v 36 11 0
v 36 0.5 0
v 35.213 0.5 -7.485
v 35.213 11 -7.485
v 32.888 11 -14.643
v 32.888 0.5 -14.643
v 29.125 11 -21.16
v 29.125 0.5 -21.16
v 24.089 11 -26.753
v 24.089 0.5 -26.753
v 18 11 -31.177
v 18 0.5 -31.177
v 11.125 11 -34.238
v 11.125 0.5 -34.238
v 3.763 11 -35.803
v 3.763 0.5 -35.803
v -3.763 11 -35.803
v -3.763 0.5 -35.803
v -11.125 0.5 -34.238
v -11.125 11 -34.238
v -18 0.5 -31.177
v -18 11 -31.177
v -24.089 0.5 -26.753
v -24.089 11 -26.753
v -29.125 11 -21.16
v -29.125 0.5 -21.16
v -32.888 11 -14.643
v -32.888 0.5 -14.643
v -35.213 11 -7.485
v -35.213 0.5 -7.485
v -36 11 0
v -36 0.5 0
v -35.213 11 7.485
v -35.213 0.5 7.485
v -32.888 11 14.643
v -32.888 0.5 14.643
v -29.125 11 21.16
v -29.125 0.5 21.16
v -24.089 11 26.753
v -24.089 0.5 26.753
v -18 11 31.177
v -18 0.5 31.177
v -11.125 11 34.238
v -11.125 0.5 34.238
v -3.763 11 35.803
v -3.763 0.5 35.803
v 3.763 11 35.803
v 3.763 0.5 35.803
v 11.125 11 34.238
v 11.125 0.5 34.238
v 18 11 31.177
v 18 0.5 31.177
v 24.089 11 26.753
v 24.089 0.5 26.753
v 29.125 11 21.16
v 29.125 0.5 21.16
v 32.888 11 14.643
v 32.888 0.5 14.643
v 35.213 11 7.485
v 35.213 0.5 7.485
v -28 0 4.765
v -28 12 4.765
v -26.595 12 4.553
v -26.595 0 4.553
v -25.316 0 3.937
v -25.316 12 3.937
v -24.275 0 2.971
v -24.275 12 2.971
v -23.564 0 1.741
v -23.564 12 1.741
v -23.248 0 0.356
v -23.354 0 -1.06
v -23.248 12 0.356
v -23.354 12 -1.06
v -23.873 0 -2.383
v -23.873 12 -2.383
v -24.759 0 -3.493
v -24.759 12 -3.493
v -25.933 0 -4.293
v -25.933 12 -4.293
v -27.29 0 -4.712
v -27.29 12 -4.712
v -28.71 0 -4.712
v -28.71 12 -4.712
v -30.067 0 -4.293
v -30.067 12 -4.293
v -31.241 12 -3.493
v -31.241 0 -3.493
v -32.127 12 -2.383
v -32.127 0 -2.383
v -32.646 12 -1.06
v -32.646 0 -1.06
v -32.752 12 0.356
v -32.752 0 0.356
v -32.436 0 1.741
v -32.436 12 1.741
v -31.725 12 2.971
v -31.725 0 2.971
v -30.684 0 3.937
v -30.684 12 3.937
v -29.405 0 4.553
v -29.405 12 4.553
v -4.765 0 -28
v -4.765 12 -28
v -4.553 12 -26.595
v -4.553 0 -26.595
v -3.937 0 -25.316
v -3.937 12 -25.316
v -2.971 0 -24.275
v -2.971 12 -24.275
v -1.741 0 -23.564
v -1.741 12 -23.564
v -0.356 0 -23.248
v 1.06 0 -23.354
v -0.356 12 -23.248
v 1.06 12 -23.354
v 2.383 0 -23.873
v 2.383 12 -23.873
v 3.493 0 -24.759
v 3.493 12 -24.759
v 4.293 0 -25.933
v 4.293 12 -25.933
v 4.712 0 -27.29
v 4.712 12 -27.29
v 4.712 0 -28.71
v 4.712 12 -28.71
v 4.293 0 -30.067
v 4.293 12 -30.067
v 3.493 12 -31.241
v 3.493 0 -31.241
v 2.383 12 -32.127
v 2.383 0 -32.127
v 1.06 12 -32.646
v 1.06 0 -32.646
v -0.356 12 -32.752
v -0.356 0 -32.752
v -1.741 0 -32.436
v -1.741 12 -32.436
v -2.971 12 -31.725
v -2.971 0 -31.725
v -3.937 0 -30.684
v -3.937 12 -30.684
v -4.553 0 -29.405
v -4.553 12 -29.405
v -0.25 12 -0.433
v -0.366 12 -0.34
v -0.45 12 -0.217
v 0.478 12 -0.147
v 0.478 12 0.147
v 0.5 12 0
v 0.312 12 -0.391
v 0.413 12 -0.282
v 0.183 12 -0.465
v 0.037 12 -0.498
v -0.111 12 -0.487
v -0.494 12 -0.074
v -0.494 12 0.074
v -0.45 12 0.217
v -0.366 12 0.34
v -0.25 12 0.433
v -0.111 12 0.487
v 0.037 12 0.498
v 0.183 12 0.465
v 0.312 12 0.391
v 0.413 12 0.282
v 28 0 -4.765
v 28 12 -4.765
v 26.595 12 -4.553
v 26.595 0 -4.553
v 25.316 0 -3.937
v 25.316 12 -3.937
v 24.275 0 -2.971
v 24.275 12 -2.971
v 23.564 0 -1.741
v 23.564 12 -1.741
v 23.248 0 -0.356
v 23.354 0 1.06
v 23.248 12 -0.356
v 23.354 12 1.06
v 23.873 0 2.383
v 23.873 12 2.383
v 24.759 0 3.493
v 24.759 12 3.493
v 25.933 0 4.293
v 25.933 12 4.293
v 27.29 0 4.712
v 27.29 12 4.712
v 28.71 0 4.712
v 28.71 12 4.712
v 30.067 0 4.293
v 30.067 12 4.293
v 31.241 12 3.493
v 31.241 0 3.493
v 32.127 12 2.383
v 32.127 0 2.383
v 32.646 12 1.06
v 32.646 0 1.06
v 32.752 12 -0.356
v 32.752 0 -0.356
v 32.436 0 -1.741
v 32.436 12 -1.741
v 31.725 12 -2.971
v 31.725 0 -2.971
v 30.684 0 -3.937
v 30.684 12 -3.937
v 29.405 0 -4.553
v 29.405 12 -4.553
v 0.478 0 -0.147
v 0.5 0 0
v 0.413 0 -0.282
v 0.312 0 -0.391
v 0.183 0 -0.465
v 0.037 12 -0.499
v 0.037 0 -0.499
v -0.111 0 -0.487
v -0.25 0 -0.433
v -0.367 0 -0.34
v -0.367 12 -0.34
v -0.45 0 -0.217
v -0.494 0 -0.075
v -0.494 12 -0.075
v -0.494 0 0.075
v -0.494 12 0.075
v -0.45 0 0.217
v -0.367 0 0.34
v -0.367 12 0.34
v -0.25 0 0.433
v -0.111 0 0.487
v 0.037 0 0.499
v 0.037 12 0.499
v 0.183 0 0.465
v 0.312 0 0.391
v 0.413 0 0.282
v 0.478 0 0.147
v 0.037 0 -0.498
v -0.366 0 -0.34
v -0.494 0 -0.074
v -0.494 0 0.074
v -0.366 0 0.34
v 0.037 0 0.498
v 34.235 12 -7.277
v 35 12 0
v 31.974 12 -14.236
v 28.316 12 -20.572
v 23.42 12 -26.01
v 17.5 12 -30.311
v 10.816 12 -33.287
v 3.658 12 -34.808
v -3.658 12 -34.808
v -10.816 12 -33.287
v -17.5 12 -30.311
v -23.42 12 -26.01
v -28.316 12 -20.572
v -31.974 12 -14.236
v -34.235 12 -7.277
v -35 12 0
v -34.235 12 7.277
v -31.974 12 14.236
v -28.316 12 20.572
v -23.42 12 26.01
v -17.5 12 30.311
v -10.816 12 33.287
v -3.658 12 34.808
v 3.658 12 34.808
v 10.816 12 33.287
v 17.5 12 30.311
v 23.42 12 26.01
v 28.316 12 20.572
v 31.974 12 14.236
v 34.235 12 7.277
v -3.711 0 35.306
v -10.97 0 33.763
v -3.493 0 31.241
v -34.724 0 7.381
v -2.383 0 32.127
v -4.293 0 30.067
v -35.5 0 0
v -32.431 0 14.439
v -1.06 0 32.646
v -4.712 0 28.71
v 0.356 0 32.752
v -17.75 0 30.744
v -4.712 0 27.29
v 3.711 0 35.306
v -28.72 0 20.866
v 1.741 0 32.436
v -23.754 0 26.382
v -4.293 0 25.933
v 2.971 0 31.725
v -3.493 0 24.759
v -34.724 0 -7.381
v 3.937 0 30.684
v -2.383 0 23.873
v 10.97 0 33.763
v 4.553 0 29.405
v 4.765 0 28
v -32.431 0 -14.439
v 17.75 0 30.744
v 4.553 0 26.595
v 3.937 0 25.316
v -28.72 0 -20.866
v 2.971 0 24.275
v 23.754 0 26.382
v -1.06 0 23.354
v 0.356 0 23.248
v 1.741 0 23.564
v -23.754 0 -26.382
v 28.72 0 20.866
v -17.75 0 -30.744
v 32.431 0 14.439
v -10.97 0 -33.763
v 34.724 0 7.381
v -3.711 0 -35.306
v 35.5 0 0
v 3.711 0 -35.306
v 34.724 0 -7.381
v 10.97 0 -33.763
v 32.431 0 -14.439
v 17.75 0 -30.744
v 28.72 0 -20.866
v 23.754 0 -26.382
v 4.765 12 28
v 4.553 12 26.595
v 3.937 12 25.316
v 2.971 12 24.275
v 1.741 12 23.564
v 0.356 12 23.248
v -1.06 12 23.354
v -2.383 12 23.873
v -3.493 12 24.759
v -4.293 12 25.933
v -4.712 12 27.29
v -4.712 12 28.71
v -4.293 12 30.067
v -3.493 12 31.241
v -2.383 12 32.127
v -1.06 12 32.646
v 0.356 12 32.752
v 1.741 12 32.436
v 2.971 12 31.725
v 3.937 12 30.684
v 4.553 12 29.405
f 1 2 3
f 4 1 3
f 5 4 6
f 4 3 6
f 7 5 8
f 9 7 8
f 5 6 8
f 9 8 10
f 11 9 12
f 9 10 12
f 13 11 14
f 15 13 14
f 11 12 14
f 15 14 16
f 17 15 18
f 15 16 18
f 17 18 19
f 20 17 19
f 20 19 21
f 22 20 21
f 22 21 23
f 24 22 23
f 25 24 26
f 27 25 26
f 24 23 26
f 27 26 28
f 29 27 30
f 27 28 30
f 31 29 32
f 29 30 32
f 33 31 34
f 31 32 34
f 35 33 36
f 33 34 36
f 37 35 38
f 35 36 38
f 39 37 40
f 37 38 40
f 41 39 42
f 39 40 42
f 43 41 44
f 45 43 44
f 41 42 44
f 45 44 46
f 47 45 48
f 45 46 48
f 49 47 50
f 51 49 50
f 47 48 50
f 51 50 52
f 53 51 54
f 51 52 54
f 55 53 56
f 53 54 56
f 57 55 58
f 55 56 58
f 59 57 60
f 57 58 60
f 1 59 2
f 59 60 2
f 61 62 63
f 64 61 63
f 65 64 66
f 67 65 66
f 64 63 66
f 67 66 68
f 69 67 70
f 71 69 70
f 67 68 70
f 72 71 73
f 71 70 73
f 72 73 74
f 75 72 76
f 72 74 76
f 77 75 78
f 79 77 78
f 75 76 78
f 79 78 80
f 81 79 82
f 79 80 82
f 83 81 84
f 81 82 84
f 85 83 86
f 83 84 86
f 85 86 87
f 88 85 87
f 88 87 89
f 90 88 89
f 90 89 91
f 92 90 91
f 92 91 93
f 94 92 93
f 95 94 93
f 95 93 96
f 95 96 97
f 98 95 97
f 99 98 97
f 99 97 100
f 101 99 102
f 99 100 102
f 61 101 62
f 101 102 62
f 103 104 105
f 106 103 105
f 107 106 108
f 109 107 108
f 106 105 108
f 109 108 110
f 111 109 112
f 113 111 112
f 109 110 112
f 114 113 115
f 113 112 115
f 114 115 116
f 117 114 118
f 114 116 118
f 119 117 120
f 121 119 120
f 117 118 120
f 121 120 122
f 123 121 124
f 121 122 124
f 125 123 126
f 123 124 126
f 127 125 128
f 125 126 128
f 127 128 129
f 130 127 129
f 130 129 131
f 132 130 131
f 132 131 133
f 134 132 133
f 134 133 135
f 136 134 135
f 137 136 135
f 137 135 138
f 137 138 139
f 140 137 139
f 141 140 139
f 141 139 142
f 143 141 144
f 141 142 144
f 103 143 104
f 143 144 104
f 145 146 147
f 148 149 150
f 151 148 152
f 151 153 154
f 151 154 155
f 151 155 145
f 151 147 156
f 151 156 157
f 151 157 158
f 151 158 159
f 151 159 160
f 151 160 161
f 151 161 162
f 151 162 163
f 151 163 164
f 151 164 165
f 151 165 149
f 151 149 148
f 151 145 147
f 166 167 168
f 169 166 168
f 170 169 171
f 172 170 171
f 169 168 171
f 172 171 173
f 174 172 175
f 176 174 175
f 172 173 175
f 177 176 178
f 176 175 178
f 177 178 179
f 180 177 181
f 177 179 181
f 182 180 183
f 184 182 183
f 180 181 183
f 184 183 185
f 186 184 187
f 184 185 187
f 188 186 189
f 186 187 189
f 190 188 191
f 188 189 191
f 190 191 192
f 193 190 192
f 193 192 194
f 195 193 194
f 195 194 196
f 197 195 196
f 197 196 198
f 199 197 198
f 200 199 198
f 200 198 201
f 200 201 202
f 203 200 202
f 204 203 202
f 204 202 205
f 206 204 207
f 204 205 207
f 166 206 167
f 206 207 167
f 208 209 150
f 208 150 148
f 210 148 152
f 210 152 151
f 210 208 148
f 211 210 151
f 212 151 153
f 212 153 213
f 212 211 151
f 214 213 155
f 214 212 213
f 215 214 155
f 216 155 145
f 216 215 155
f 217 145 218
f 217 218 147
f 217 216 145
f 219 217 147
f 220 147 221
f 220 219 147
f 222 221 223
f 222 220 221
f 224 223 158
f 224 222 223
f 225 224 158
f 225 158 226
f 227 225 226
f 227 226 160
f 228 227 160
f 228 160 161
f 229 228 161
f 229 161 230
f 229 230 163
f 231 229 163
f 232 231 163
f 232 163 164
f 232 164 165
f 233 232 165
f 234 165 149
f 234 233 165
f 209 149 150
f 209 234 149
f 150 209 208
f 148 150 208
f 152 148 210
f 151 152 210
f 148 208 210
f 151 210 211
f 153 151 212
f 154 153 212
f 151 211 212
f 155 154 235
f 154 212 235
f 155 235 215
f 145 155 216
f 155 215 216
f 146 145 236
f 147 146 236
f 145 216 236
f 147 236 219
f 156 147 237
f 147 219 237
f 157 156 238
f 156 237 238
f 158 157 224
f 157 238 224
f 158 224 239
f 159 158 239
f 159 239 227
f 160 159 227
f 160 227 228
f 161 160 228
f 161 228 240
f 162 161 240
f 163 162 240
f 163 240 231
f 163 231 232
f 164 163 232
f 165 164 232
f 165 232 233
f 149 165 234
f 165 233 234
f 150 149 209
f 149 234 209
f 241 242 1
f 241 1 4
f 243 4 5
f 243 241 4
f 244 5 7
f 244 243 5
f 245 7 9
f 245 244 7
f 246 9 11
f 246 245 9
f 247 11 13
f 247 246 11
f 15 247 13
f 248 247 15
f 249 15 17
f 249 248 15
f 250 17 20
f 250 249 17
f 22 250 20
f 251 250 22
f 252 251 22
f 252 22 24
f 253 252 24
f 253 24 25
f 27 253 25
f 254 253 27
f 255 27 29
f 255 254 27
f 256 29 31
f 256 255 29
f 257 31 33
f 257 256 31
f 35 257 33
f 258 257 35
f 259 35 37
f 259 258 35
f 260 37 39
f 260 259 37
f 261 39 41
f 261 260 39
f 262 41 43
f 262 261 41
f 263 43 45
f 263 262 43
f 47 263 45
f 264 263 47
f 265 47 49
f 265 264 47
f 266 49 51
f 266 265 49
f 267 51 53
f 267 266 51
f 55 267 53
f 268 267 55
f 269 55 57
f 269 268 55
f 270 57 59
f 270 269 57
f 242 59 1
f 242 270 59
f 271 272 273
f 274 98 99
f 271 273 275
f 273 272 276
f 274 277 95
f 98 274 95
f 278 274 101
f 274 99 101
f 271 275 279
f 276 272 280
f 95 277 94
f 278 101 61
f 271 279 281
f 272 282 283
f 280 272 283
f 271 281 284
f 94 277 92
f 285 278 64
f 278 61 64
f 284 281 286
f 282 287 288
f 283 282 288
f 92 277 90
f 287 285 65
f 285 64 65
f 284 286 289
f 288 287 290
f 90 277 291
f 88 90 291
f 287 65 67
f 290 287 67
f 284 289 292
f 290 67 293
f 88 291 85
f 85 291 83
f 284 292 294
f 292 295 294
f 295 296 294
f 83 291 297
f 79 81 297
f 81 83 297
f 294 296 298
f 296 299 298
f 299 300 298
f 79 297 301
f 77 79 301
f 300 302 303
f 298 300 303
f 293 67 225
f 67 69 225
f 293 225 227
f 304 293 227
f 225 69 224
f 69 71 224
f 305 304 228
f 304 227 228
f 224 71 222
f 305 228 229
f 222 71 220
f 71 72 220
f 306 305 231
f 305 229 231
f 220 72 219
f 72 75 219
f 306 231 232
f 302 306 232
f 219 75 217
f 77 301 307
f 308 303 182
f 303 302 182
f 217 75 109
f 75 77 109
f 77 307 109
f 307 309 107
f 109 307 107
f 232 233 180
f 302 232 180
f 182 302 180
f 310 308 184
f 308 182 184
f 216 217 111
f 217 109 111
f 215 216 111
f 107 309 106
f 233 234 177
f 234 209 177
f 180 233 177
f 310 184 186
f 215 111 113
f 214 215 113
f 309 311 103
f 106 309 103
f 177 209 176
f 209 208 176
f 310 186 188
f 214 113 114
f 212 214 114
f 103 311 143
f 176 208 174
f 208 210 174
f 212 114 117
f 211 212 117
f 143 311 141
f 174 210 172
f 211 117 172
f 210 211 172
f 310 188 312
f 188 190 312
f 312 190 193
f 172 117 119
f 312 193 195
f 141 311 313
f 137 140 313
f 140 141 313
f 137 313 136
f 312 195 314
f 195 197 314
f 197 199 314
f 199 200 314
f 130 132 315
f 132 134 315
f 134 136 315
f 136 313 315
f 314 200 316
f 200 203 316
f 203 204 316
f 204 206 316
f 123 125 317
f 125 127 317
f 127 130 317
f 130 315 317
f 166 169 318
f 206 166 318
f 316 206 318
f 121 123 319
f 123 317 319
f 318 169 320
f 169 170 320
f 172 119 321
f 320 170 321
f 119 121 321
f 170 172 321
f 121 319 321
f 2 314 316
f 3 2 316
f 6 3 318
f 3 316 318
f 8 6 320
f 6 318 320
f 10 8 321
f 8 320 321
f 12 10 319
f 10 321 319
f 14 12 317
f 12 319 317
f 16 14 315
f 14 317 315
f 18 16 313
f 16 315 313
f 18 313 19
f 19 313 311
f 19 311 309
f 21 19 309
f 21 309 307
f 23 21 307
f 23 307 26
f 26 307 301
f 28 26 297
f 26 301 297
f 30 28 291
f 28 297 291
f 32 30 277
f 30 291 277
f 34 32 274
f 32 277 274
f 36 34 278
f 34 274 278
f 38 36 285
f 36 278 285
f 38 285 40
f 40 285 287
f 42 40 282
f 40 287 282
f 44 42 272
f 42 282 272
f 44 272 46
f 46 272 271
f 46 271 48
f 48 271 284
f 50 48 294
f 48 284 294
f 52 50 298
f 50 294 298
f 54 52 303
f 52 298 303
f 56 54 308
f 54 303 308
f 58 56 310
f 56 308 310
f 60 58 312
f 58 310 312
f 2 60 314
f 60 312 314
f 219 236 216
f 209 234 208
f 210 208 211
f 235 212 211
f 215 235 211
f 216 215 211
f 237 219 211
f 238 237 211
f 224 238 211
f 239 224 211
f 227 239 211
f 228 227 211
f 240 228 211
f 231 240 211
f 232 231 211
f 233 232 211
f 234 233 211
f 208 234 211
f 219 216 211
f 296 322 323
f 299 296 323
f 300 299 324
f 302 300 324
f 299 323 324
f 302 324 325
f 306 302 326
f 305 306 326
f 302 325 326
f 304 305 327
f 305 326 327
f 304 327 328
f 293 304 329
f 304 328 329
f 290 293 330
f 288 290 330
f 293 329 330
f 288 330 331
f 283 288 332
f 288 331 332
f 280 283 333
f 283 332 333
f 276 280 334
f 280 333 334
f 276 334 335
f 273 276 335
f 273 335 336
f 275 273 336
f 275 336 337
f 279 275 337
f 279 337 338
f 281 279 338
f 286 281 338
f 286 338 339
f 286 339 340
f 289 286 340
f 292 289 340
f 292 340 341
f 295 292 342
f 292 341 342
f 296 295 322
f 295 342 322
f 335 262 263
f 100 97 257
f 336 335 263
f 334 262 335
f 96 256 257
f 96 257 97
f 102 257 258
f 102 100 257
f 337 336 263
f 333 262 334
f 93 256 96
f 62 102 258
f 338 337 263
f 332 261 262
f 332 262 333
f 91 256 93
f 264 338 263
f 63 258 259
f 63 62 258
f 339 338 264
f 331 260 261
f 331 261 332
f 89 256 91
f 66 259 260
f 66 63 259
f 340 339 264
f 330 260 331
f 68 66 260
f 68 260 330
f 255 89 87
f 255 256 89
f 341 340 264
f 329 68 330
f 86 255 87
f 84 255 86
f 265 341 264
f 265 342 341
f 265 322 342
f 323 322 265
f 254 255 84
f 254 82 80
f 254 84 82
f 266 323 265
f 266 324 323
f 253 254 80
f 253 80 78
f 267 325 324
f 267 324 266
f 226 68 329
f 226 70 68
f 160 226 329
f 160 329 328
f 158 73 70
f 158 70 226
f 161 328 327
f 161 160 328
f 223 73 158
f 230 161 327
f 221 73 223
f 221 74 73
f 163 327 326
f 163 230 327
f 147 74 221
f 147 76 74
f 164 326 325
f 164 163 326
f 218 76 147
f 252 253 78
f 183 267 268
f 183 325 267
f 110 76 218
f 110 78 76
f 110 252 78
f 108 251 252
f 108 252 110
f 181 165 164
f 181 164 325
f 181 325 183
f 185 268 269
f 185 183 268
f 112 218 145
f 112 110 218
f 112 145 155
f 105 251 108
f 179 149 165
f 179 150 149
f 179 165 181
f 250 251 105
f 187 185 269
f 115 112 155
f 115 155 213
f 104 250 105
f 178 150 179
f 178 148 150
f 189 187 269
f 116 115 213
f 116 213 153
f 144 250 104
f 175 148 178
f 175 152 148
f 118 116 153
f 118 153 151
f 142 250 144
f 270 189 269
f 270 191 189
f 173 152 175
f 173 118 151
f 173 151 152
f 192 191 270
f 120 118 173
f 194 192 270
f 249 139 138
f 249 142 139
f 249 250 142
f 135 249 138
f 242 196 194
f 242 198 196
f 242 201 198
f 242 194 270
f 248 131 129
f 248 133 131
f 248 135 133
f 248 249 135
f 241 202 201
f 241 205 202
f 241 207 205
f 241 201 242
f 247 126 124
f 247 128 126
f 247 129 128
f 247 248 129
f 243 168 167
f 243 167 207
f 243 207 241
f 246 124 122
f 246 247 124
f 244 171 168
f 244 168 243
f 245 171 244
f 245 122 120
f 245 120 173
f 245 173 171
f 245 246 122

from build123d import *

# Parameters (mm, degrees)
SKETCH1_R           = 36
SKETCH1_R_2         = 0.5
BOSS_EXTRUDE1_DEPTH = 12
SKETCH4_R           = 4.765
CUT_EXTRUDE1_DEPTH  = 12
CIRPATTERN1_COUNT   = 4
CHAMFER1_SIZE       = 1
CHAMFER2_SIZE       = 0.5
SKETCH5_R           = 0.499735392
BOSS_EXTRUDE2_DEPTH = 12


with BuildPart() as part:
    # Sketch1 → Boss-Extrude1 (new body)
    with BuildSketch(Plane(origin=(0, 0, 0), x_dir=(1, 0, 0), z_dir=(0, 1, 0))):
        Circle(SKETCH1_R)
        Circle(SKETCH1_R_2, mode=Mode.SUBTRACT)
    extrude(amount=BOSS_EXTRUDE1_DEPTH)

    # Sketch4 → Cut-Extrude1 (cut)
    with BuildSketch(Plane(origin=(0, 12, 0), x_dir=(1, 0, 0), z_dir=(0, 1, 0))):
        with Locations((0, -28)):
            Circle(SKETCH4_R)
    cut_extrude1 = extrude(amount=-CUT_EXTRUDE1_DEPTH, mode=Mode.SUBTRACT)

    # CirPattern1: Cut-Extrude1 ×4 about axis
    cirpattern1_axis = Axis((0, 0, 0), (0, 1, 0))
    for i in range(1, CIRPATTERN1_COUNT):
        add(cut_extrude1.rotate(cirpattern1_axis, i * 360 / CIRPATTERN1_COUNT), mode=Mode.SUBTRACT)

    # Chamfer1
    chamfer1_edges = [part.edges().sort_by_distance(p)[0] for p in [
        (-36, 12, 0),
    ]]
    chamfer(chamfer1_edges, length=CHAMFER1_SIZE)

    # Chamfer2
    chamfer2_edges = [part.edges().sort_by_distance(p)[0] for p in [
        (-36, 0, 0),
    ]]
    chamfer(chamfer2_edges, length=CHAMFER2_SIZE)


with BuildPart() as body_2:
    # Sketch5 → Boss-Extrude2 (new body, through all)
    with BuildSketch(Plane(origin=(0, 0, 0), x_dir=(1, 0, 0), z_dir=(0, 1, 0))):
        Circle(SKETCH5_R)
    extrude(amount=BOSS_EXTRUDE2_DEPTH)


solid = Compound([part.part, body_2.part])
